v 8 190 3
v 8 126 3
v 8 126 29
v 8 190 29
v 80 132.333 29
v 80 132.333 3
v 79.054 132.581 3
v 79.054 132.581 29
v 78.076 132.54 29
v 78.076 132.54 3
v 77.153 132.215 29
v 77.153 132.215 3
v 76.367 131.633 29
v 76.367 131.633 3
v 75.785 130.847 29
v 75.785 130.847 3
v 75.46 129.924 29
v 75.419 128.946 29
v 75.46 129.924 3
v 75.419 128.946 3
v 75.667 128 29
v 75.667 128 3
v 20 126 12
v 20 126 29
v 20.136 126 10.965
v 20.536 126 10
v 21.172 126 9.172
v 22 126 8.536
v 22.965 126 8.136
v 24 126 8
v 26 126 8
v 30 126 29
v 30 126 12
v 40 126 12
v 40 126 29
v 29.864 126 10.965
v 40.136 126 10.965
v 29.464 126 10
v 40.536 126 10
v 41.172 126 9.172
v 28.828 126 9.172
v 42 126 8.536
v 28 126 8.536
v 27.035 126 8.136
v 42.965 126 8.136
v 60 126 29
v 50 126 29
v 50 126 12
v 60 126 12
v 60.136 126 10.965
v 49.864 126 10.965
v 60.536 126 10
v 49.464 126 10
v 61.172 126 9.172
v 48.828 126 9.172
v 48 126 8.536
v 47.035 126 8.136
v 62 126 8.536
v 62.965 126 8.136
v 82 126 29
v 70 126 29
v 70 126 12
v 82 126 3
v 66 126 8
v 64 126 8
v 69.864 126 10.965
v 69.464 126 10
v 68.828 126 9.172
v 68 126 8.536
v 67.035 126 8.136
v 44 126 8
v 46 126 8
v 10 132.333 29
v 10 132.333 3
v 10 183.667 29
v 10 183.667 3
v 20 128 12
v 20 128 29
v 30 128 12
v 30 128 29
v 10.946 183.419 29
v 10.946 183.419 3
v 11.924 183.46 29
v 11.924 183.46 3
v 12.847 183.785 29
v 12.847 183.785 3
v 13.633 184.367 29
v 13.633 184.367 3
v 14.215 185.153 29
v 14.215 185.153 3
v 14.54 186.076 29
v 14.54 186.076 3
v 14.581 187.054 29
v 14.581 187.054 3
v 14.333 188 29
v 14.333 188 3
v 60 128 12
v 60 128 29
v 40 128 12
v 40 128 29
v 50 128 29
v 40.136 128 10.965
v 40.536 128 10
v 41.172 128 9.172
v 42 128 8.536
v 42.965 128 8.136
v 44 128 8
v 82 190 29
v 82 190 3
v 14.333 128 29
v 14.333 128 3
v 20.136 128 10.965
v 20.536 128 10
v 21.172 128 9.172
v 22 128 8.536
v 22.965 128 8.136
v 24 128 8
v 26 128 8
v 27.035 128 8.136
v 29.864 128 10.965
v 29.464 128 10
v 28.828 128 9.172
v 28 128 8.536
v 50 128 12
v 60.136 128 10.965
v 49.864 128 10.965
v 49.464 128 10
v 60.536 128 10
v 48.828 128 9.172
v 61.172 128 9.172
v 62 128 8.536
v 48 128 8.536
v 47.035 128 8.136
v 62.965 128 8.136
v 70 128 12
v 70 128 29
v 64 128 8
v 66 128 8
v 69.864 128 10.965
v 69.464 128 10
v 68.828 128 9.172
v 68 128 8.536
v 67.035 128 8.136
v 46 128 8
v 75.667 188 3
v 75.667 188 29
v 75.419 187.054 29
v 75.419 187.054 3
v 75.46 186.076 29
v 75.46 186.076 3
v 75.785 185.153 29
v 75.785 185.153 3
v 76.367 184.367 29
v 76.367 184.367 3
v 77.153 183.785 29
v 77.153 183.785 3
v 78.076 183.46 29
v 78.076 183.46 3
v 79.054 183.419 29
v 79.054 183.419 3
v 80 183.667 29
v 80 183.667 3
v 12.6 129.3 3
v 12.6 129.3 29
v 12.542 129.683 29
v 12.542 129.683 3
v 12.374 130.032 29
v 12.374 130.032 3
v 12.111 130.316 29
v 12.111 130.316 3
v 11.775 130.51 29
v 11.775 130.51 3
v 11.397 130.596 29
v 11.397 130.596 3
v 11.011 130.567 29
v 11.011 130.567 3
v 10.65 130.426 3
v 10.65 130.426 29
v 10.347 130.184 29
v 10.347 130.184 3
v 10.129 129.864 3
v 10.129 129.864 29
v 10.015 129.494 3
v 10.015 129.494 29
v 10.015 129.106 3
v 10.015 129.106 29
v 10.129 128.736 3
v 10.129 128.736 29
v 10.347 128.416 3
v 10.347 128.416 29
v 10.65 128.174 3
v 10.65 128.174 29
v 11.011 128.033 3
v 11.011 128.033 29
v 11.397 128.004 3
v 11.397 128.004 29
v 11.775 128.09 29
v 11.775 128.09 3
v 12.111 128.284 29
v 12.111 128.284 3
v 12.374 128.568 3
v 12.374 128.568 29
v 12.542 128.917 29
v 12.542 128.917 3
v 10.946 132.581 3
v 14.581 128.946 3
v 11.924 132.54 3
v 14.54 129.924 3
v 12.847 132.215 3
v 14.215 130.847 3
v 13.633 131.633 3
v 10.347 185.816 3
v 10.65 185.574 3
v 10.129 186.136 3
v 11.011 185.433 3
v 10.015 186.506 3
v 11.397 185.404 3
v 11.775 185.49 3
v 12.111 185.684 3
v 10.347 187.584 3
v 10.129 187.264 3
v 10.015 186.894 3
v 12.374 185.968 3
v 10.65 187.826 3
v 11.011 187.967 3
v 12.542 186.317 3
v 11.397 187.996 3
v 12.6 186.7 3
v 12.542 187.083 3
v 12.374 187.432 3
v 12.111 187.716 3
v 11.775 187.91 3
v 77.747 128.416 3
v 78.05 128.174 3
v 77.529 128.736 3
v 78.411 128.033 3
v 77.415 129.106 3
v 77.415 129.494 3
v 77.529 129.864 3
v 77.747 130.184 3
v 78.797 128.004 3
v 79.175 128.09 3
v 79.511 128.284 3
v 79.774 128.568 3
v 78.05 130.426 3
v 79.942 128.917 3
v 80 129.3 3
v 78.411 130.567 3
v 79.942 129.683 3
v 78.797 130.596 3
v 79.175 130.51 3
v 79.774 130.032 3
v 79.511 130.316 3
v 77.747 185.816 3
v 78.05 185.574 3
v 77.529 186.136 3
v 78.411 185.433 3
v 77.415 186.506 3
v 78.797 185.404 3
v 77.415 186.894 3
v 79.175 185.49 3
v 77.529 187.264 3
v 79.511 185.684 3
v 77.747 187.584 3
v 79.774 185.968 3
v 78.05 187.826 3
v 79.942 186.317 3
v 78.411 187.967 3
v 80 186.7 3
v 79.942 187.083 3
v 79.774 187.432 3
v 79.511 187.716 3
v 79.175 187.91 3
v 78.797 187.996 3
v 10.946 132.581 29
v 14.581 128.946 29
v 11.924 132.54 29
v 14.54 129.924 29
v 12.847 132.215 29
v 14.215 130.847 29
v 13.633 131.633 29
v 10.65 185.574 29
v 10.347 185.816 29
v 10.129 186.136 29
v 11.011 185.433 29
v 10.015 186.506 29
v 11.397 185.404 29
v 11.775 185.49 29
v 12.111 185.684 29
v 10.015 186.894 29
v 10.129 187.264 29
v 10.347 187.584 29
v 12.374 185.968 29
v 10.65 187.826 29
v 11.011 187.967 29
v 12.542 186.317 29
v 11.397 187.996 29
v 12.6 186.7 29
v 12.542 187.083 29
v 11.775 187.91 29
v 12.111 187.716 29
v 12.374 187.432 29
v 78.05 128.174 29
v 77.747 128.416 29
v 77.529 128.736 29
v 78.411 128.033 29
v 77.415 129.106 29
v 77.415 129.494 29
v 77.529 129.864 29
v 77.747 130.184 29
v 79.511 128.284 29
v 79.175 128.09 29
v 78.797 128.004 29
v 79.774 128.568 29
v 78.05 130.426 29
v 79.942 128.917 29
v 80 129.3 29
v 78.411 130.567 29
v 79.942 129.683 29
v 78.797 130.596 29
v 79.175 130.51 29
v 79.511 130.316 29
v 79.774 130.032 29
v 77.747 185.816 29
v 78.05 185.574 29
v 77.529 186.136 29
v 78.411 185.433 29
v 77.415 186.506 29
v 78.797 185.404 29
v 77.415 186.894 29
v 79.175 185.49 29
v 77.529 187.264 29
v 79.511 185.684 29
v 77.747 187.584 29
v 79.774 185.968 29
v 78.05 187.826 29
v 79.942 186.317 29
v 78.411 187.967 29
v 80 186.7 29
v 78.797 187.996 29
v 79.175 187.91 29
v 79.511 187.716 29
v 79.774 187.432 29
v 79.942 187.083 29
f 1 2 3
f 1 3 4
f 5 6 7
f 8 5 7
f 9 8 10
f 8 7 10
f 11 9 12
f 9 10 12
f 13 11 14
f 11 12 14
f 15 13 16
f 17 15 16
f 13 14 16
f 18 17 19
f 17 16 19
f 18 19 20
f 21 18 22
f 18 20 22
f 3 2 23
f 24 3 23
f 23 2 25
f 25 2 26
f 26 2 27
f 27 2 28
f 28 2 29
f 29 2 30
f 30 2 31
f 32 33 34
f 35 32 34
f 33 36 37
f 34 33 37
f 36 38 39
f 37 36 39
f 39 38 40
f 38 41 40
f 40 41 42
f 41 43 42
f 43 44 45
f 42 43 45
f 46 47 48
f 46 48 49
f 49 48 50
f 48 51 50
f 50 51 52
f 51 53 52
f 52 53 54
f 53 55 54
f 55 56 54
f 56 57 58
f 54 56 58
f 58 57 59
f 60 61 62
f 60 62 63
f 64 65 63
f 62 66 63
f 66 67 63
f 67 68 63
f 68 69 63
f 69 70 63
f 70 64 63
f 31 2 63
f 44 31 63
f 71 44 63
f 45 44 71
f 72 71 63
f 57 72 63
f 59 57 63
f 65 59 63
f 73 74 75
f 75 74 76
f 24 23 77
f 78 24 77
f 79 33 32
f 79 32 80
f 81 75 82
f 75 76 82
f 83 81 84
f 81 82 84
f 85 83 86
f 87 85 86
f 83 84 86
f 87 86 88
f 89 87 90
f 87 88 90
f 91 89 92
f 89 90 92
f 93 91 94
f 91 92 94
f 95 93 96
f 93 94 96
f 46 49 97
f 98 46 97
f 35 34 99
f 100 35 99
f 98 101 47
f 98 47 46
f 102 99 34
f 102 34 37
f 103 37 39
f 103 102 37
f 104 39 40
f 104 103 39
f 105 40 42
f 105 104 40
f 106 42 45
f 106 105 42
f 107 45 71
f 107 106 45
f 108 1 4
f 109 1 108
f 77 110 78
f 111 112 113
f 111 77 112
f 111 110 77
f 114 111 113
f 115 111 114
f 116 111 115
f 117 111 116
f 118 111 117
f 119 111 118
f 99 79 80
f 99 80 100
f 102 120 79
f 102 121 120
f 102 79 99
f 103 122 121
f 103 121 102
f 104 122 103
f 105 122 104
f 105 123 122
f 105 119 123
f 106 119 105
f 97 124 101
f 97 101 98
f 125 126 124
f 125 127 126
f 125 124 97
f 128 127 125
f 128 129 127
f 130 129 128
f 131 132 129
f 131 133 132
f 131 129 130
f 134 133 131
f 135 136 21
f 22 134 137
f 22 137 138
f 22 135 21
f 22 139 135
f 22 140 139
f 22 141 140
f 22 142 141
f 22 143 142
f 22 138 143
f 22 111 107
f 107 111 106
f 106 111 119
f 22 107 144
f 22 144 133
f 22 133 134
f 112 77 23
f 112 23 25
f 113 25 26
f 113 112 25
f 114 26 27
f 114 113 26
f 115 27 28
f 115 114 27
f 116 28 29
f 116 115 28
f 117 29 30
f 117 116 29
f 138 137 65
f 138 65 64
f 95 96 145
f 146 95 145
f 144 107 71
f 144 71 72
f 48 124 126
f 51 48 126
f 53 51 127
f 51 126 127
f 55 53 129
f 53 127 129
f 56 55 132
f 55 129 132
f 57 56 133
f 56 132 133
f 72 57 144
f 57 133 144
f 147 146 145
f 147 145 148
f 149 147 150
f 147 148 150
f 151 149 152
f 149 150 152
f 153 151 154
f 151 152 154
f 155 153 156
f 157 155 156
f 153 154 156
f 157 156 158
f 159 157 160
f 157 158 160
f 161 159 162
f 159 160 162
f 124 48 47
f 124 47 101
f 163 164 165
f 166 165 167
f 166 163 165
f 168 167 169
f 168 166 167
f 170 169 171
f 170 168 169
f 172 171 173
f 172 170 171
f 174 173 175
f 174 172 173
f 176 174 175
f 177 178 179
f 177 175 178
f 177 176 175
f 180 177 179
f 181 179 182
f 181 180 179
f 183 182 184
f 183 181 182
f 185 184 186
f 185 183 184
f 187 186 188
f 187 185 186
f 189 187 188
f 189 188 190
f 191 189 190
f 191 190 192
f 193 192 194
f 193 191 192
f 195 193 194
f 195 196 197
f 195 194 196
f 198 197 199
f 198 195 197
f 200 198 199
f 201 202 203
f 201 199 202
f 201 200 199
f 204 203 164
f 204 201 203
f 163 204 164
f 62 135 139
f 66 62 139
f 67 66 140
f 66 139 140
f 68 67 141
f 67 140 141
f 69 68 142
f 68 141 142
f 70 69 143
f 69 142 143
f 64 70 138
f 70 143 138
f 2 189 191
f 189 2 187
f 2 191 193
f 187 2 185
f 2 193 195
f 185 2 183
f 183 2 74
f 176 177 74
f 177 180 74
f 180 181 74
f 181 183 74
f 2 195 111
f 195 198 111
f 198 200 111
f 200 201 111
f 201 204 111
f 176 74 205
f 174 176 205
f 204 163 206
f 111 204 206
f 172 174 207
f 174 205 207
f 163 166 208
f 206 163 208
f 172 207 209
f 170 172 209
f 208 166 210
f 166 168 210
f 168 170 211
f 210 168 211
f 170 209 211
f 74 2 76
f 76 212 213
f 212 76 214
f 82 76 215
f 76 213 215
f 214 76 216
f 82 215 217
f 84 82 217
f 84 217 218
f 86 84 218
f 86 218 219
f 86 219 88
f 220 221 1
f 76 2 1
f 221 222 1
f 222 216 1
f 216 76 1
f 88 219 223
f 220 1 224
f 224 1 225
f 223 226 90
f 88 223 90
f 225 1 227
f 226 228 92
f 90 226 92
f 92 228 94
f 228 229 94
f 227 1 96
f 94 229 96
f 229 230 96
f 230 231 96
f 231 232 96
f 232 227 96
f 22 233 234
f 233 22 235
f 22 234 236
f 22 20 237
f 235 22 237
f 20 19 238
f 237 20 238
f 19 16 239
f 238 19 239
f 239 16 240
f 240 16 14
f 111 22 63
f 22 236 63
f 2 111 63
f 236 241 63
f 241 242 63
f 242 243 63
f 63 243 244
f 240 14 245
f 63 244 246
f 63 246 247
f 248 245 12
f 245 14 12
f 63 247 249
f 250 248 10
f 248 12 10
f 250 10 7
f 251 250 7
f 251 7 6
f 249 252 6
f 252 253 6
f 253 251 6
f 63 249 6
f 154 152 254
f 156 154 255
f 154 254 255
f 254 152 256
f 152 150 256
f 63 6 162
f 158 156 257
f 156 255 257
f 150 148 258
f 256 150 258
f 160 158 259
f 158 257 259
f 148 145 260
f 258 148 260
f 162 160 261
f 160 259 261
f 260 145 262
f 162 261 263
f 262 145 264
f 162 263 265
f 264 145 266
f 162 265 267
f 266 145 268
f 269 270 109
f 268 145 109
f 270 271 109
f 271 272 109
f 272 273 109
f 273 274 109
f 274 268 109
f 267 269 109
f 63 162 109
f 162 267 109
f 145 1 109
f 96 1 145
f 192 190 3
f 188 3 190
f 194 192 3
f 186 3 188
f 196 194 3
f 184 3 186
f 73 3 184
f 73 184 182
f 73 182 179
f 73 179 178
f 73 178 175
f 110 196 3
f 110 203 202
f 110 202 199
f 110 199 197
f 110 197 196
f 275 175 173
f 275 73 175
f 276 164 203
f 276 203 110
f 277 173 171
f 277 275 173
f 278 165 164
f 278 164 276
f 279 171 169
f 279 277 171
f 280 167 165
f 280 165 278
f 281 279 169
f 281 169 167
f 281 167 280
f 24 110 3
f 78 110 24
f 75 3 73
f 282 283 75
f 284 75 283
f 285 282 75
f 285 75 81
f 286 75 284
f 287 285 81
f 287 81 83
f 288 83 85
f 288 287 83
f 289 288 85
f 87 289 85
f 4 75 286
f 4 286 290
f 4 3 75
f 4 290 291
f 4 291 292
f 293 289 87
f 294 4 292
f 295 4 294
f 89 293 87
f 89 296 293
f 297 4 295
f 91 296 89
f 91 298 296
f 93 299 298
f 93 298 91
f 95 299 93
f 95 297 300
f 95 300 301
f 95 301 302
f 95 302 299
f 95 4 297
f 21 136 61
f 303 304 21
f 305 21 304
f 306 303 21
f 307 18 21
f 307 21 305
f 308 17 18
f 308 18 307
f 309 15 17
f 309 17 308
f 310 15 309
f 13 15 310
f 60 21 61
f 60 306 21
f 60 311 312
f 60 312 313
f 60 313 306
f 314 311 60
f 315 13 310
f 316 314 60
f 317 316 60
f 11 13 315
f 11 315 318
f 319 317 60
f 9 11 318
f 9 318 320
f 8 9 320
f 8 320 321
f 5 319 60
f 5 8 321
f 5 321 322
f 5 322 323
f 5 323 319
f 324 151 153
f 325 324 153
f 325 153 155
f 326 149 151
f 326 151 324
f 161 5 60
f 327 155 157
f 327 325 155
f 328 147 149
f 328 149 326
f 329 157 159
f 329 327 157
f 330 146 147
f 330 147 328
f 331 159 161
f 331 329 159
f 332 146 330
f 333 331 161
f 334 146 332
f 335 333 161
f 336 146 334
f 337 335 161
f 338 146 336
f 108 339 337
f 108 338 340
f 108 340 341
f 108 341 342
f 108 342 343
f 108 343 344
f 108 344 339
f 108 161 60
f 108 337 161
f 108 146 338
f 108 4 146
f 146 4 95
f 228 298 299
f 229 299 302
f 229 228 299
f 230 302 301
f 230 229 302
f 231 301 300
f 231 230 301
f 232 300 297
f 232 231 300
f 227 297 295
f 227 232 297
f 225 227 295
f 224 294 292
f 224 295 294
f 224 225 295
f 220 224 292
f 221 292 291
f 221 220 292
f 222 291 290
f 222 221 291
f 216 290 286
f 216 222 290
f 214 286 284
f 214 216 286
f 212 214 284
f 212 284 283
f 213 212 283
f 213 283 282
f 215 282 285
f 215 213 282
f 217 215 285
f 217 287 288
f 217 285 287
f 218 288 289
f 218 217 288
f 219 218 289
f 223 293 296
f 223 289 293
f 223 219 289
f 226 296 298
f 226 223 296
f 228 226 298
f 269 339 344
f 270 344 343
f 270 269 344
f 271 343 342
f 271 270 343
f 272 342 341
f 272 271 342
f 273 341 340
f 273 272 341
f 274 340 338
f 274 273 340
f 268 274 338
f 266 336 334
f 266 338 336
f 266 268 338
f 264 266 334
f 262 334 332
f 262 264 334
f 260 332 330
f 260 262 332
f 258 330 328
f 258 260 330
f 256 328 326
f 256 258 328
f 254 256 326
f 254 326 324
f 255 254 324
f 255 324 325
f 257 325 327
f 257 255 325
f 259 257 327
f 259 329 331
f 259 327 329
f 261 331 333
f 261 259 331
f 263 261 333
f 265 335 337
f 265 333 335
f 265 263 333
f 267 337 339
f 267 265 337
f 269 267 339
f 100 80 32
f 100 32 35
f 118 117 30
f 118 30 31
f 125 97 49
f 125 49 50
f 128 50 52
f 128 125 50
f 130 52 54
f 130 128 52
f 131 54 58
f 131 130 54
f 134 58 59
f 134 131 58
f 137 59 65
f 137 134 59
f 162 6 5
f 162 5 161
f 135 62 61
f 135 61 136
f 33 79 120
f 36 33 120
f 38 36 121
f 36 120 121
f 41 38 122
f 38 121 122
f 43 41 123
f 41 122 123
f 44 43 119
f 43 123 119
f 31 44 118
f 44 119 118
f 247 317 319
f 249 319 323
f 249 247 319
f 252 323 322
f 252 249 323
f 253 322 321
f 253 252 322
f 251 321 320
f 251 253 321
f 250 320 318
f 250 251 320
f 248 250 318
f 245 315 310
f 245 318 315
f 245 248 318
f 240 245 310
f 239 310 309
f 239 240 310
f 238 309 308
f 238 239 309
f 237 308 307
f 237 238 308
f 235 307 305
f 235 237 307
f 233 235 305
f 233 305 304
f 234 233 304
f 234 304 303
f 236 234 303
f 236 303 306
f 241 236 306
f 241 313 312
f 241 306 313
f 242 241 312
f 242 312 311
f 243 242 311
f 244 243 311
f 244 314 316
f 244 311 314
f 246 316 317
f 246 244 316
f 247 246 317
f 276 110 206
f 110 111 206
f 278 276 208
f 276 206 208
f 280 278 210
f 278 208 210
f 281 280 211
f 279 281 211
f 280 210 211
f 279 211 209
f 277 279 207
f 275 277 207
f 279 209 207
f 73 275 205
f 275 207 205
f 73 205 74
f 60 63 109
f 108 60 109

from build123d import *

# Parameters (mm, degrees)
BOX010_W          = 10
BOX010_H          = 10
BOX010_DEPTH      = 21
FILLET001_R       = 4
ARRAY008_X_COUNT  = 3
ARRAY008_X_PITCH  = 20
BOX008_W          = 70
BOX008_H          = 60
BOX008_DEPTH      = 26
BOX007_W          = 74
BOX007_H          = 64
BOX007_DEPTH      = 26
CYLINDER007_R     = 1.3
CYLINDER007_DEPTH = 26
CYLINDER006_R     = 3.3
CYLINDER006_DEPTH = 26
ARRAY004_X_COUNT  = 2
ARRAY004_X_PITCH  = 67.4
ARRAY004_Y_COUNT  = 2
ARRAY004_Y_PITCH  = 57.4


with BuildPart() as wall_hole_array:
    # Box010 → Box010 (new body)
    with BuildSketch(Plane(origin=(34.5, -4.5, 8), x_dir=(1, 0, 0), z_dir=(0, 0, 1))):
        with Locations((5, 5)):
            Rectangle(BOX010_W, BOX010_H)
    extrude(amount=BOX010_DEPTH)

    # Fillet001
    fillet001_edges = [wall_hole_array.edges().sort_by_distance(p)[0] for p in [
        (34.5, 0.5, 8),
        (44.5, 0.5, 8),
    ]]
    fillet(fillet001_edges, radius=FILLET001_R)

    # Array008 X: wall hole array ×3


with BuildPart() as wall_hole_array_1:
    add(wall_hole_array.part)
    with Locations(*[(i * ARRAY008_X_PITCH, 0, 0) for i in range(1, ARRAY008_X_COUNT)]):
        add(wall_hole_array.part)


with BuildPart() as wall_hole_array_2:
    # Array008 placement: moved
    add(wall_hole_array_1.part.moved(Location((-22.5, 0, 0))))


with BuildPart() as wall_inner_extraction:
    # Box008 → Box008 (new body)
    with BuildSketch(Plane(origin=(2, 2, 0), x_dir=(1, 0, 0), z_dir=(0, 0, 1))):
        with Locations((35, 30)):
            Rectangle(BOX008_W, BOX008_H)
    extrude(amount=BOX008_DEPTH)


with BuildPart() as wall_box_cut:
    # Box007 → Box007 (new body)
    with BuildSketch(Plane.XY):
        with Locations((37, 32)):
            Rectangle(BOX007_W, BOX007_H)
    extrude(amount=BOX007_DEPTH)

    # Cut004: cut wall inner extraction
    add(wall_inner_extraction.part, mode=Mode.SUBTRACT)


with BuildPart() as wall_box_hole:
    # Cylinder007 → Cylinder007 (new body)
    with BuildSketch(Plane.XY):
        Circle(CYLINDER007_R)
    extrude(amount=CYLINDER007_DEPTH)


with BuildPart() as wall_fusion_cut:
    # Cylinder006 → Cylinder006 (new body)
    with BuildSketch(Plane.XY):
        Circle(CYLINDER006_R)
    extrude(amount=CYLINDER006_DEPTH)

    # Cut005: cut wall box hole
    add(wall_box_hole.part, mode=Mode.SUBTRACT)


with BuildPart() as wall_fusion_cut_1:
    # Cut005 placement: moved
    add(wall_fusion_cut.part.moved(Location((3.3, 3.3, 0))))

    # Array004 X: wall fusion cut ×2


with BuildPart() as wall_fusion_cut_2:
    add(wall_fusion_cut_1.part)
    with Locations(*[(i * ARRAY004_X_PITCH, 0, 0) for i in range(1, ARRAY004_X_COUNT)]):
        add(wall_fusion_cut_1.part)

    # Array004 Y: wall fusion cut ×2


with BuildPart() as wall_fusion_cut_3:
    add(wall_fusion_cut_2.part)
    with Locations(*[(0, i * ARRAY004_Y_PITCH, 0) for i in range(1, ARRAY004_Y_COUNT)]):
        add(wall_fusion_cut_2.part)

    # Fusion003: union wall box cut
    add(wall_box_cut.part)


with BuildPart() as wall_fusion_cut_4:
    # Fusion003 placement: moved
    add(wall_fusion_cut_3.part.moved(Location((0, 0, 3))))

    # Cut007: cut wall hole array
    add(wall_hole_array_2.part, mode=Mode.SUBTRACT)


with BuildPart() as wall_fusion_cut_5:
    # Cut007 placement: moved
    add(wall_fusion_cut_4.part.moved(Location((8, 126, 0))))


solid = wall_fusion_cut_5.part
